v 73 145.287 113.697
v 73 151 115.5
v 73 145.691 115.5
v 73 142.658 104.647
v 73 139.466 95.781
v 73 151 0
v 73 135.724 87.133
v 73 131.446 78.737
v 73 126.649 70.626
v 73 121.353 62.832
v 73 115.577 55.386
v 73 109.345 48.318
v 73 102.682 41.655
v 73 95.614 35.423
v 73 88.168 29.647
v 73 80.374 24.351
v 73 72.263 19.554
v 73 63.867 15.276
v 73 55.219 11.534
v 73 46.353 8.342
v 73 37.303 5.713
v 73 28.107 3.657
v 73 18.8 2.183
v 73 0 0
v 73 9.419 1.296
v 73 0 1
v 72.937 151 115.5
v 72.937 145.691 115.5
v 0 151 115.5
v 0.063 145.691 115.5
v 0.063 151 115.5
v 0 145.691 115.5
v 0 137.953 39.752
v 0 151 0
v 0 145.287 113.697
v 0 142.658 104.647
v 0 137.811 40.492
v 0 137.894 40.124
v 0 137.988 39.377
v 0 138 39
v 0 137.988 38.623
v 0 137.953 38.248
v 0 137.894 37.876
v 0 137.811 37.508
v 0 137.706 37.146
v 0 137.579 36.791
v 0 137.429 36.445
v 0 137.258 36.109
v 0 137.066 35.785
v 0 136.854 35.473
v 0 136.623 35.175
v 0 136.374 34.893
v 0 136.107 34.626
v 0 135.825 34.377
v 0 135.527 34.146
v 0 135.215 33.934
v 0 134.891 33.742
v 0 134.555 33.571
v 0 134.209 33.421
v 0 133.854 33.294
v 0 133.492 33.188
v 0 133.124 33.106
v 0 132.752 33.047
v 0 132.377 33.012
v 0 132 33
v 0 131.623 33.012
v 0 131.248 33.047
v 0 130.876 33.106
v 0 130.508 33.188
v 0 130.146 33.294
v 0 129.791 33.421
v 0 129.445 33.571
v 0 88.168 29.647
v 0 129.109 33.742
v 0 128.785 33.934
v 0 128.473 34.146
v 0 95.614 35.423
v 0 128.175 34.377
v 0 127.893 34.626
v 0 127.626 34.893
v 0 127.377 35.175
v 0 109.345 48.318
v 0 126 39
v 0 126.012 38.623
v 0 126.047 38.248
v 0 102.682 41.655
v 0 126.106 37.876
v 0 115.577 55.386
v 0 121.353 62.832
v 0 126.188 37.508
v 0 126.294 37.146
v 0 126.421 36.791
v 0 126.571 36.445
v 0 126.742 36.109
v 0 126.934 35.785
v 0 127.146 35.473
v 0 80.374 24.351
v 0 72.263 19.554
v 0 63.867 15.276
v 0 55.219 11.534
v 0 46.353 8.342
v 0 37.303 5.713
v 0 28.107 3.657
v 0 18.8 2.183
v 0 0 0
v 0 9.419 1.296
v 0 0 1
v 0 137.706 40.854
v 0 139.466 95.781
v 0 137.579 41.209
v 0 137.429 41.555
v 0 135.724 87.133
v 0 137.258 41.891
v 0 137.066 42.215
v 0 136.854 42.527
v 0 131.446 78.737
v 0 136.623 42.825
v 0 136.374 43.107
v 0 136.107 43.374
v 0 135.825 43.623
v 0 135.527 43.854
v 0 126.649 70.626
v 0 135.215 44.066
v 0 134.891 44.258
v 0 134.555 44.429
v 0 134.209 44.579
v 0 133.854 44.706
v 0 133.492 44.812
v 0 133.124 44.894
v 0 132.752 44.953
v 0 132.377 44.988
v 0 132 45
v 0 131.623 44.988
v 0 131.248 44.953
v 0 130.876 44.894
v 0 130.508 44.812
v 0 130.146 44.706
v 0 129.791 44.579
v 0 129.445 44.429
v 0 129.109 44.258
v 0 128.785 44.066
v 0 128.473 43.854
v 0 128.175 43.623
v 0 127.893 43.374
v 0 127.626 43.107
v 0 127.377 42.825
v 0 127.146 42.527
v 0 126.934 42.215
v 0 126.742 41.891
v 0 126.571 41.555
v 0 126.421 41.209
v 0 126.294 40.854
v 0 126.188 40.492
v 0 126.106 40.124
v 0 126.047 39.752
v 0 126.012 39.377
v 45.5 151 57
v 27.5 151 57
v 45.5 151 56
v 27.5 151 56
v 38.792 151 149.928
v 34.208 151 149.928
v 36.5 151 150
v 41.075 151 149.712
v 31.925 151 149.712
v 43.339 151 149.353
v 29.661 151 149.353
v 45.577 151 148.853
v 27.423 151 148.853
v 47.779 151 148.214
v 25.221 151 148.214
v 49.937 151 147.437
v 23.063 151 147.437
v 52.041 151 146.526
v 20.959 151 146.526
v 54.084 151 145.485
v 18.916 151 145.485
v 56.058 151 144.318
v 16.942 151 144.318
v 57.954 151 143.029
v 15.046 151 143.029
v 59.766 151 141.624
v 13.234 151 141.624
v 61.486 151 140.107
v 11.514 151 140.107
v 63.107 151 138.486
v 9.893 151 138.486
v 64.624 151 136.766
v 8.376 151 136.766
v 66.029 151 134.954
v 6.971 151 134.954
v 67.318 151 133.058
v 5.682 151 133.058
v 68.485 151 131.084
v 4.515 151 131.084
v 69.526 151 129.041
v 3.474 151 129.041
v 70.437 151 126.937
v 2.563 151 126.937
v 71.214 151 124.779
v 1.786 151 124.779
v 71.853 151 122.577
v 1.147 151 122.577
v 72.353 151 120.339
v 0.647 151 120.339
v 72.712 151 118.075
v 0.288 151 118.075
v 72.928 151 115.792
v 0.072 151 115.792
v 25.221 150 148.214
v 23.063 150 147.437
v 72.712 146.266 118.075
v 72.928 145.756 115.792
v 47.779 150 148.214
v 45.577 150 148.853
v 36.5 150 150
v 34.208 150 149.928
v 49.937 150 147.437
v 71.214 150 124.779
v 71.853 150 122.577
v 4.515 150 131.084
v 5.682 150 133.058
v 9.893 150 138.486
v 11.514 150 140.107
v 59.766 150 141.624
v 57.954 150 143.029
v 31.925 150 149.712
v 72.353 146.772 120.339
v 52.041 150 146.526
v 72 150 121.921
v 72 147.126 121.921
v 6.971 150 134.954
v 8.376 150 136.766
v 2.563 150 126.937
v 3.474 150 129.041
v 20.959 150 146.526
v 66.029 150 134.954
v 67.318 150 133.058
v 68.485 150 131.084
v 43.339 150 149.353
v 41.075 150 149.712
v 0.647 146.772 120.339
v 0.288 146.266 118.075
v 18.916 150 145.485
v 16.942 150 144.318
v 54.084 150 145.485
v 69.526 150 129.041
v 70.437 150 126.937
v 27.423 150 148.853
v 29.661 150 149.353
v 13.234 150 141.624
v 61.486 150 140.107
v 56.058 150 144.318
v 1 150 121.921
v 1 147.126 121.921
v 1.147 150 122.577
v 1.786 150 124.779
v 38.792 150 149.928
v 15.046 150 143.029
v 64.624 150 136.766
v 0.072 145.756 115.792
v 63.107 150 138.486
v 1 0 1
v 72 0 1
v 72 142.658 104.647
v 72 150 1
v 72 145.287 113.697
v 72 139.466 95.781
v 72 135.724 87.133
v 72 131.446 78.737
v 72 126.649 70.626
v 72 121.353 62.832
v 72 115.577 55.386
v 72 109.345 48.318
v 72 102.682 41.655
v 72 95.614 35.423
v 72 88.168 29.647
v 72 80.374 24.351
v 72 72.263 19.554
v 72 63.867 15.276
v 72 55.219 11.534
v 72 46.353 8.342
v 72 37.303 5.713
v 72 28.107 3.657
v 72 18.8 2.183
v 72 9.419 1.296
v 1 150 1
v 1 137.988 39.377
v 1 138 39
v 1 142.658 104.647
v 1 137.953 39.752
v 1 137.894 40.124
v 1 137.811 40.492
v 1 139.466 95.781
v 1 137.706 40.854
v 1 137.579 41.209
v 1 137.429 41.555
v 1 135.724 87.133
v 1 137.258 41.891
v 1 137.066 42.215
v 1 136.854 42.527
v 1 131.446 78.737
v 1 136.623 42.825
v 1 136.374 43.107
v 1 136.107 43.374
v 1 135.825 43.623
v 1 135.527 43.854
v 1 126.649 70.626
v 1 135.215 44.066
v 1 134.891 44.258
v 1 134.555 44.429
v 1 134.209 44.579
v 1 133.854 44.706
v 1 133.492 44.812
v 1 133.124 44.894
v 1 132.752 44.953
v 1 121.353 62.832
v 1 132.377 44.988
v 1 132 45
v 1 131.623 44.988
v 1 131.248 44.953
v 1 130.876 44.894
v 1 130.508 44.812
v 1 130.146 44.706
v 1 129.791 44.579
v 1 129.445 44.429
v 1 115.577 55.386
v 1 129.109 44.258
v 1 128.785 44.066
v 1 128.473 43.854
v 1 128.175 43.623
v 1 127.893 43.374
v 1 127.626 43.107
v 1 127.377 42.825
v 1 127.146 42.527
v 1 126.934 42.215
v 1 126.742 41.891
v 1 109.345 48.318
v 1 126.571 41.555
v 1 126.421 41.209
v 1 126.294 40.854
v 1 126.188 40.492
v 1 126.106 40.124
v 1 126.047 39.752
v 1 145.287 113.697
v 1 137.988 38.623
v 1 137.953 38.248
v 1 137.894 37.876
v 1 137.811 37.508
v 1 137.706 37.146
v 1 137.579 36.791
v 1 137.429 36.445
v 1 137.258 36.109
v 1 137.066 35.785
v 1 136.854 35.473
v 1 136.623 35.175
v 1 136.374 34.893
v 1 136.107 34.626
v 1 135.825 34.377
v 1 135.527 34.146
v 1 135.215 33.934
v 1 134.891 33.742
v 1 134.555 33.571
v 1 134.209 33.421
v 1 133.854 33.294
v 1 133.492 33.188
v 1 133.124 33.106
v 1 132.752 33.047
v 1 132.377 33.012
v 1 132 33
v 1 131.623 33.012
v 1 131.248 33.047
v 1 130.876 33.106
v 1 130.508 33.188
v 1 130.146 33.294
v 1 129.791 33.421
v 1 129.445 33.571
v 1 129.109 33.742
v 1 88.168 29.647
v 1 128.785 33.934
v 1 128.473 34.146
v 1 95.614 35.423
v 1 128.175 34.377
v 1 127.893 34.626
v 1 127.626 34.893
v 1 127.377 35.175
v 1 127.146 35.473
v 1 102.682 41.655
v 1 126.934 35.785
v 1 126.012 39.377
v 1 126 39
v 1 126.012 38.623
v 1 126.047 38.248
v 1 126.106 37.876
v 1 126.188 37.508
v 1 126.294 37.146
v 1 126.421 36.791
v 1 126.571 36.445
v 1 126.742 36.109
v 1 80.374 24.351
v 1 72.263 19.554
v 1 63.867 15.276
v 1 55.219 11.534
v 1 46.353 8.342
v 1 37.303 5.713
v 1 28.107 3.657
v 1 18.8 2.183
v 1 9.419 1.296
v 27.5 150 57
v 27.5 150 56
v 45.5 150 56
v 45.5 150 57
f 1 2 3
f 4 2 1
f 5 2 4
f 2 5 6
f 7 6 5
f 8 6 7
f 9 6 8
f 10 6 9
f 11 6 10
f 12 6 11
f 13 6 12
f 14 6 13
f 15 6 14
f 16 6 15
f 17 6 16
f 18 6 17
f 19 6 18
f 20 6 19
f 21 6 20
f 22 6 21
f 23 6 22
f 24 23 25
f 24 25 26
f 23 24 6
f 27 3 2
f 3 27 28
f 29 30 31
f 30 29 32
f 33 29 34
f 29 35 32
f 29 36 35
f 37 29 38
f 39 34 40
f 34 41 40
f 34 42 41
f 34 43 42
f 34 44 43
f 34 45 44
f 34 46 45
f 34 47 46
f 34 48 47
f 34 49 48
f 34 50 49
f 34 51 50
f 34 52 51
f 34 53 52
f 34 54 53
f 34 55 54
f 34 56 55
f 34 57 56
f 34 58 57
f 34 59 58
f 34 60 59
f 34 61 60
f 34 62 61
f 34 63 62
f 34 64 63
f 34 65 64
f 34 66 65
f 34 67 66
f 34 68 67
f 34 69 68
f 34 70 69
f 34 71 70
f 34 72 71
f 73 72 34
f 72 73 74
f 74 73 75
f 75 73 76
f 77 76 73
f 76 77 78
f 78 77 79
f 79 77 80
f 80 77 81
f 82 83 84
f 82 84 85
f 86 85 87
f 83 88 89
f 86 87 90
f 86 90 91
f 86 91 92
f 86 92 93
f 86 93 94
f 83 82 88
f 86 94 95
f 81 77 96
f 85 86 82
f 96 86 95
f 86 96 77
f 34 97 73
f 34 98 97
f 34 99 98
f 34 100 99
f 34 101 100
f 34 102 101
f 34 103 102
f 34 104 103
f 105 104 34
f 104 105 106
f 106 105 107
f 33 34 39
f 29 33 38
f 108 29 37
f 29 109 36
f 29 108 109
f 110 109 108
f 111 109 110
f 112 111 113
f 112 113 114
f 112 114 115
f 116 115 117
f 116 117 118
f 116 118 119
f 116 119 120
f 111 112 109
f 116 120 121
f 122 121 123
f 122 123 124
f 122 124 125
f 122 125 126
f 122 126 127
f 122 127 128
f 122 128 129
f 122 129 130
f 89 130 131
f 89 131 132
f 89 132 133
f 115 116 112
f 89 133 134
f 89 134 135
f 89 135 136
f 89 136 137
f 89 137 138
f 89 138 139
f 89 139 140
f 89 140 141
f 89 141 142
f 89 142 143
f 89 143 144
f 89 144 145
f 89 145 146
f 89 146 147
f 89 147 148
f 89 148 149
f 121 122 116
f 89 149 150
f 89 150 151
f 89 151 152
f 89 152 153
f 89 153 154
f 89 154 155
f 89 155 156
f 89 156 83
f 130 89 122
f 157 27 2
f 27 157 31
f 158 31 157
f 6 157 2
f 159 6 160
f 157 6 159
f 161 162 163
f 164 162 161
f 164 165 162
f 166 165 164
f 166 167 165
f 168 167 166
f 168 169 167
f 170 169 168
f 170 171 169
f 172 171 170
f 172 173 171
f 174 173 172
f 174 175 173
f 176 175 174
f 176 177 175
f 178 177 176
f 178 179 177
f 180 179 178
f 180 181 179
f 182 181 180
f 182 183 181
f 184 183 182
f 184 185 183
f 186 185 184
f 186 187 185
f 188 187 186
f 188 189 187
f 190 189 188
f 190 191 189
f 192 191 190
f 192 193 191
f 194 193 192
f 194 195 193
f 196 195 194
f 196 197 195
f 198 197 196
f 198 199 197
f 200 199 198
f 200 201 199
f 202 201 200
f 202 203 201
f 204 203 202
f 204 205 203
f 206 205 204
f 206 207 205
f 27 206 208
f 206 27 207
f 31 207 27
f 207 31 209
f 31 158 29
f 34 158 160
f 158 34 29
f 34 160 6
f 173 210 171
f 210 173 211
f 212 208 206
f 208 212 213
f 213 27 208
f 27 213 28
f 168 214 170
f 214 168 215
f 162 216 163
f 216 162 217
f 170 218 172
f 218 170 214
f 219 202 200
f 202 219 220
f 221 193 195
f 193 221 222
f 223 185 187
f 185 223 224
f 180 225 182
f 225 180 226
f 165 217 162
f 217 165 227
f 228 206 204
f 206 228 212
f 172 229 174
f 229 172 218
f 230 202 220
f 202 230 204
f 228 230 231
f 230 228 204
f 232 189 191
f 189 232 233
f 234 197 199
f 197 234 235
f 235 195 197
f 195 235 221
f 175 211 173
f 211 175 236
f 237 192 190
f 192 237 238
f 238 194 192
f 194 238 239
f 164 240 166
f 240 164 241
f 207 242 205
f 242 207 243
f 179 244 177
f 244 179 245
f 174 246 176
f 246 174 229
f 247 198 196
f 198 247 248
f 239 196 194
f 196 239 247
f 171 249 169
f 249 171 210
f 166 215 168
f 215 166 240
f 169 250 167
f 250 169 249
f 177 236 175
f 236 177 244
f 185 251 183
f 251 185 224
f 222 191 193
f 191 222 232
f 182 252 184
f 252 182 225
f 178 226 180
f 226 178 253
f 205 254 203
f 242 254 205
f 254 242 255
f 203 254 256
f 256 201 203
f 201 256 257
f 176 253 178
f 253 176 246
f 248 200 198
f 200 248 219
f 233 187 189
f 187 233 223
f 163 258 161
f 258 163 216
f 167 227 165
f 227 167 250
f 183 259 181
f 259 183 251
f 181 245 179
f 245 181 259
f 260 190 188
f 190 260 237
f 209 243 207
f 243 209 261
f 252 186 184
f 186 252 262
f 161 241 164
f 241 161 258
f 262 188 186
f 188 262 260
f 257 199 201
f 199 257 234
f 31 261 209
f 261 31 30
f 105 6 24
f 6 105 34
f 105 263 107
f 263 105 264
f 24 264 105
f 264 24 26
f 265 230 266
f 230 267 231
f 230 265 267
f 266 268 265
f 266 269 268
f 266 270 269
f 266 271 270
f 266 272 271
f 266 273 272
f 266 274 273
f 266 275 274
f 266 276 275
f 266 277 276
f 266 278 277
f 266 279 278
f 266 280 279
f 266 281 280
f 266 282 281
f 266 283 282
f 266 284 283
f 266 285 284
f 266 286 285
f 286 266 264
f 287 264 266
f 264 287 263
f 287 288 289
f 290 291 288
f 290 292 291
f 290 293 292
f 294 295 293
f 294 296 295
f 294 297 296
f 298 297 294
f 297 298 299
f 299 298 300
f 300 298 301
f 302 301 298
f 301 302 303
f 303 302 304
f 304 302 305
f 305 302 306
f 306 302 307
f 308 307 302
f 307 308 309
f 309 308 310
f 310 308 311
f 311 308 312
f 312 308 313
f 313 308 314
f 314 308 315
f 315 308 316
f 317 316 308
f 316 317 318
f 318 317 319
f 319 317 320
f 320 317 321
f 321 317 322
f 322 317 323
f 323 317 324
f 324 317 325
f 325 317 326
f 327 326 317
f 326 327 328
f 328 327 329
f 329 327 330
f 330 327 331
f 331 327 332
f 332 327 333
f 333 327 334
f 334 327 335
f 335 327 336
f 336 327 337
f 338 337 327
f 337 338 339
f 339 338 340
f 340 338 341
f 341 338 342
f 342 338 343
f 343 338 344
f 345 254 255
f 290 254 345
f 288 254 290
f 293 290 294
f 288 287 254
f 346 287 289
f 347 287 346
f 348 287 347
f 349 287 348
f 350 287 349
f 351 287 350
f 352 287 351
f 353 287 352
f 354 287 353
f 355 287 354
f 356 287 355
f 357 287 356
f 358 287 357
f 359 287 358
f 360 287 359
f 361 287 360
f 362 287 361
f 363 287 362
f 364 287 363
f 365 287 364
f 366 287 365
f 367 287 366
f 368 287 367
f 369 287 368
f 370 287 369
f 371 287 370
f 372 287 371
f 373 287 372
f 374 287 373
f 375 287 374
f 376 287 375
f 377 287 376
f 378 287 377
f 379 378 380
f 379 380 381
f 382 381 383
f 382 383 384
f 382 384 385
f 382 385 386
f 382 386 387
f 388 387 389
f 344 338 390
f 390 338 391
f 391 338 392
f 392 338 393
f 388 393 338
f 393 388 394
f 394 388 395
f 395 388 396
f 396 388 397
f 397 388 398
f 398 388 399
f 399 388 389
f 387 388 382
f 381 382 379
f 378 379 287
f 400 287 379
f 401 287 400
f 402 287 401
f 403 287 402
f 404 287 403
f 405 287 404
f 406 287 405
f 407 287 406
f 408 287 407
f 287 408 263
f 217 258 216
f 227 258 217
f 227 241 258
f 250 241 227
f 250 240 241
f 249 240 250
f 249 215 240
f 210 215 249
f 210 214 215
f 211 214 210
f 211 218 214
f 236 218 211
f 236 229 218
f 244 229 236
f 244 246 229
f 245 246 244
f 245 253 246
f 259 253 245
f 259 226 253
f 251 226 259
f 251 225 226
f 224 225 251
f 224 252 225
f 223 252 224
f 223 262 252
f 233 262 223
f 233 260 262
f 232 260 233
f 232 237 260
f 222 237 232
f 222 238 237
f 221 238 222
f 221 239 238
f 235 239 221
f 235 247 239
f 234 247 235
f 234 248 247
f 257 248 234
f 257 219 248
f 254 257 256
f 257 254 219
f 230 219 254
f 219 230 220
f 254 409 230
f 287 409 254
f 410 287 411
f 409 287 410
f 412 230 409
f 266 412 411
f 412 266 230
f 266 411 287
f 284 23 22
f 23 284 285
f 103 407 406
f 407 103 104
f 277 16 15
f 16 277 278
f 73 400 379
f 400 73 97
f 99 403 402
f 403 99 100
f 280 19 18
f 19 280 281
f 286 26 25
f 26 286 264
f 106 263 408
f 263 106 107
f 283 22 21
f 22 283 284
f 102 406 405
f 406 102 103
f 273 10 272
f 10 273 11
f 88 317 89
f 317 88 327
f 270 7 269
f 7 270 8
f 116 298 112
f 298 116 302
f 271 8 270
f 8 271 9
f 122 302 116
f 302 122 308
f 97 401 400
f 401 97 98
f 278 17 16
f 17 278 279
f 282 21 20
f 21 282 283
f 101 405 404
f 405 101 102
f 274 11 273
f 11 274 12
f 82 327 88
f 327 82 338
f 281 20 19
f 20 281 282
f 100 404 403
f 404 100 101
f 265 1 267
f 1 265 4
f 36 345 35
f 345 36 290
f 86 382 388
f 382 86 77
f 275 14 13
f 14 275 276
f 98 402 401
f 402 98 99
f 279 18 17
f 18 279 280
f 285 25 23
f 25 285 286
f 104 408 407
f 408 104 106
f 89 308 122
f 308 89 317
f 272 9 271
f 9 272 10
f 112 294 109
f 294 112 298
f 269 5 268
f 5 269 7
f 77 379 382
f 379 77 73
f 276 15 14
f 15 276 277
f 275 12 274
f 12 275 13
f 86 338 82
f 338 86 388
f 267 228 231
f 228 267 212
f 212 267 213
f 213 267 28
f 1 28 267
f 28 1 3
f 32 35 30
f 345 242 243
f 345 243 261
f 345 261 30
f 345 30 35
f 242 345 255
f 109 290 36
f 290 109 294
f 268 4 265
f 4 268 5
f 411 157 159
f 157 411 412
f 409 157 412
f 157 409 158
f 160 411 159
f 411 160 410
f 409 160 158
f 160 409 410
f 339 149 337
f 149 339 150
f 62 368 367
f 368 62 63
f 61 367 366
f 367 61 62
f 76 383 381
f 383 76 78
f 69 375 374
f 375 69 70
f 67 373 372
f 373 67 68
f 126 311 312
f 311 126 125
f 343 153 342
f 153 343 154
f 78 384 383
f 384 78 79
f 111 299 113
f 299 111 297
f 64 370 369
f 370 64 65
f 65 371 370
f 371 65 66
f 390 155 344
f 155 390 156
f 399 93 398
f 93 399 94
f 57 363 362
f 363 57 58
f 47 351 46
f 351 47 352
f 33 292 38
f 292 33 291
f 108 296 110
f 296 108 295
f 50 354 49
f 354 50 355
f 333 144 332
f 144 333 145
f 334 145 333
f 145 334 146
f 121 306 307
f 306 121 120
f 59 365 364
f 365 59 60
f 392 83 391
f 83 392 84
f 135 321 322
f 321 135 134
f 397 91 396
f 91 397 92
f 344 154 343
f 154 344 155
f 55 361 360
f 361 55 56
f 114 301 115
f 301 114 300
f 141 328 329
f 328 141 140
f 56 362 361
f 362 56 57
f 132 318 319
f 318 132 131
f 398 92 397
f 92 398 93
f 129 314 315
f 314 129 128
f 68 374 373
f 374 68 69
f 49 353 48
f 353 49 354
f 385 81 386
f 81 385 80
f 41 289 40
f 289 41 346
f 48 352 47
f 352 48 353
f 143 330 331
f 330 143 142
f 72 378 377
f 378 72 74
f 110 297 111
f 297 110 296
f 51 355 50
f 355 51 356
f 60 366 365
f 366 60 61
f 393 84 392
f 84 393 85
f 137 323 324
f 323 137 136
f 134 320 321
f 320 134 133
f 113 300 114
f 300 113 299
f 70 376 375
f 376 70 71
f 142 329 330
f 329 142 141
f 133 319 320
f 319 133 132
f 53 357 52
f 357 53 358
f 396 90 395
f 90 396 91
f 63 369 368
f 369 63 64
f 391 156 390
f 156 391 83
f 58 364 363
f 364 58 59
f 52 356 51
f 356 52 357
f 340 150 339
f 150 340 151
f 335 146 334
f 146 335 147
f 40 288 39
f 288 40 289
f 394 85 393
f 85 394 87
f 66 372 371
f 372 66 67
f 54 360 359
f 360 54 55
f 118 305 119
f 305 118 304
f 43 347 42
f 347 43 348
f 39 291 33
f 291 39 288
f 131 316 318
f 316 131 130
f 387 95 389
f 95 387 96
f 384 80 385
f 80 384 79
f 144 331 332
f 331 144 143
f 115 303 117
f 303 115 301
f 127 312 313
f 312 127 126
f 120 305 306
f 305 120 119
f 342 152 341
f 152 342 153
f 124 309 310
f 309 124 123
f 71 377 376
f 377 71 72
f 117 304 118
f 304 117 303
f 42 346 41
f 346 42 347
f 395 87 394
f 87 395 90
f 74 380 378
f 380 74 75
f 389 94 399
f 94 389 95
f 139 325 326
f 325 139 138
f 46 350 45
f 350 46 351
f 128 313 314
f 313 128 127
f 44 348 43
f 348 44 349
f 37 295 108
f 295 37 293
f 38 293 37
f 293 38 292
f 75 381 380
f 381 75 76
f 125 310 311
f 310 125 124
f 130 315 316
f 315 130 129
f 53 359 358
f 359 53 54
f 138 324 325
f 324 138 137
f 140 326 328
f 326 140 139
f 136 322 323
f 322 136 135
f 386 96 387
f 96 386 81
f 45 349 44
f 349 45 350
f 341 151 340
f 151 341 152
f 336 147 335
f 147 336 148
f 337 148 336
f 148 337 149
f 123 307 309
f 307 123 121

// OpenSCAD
width=71;
length=150;
main_height=20;
front_height=150;
wall=1;

camera_cable_hole_width=18;
camera_cable_hole_height=1;
camera_cable_hole_z=56;

power_hole_z = 38;
power_hole_y=length-18;
power_hole_r=6;

$fn=100;

difference() {
    cube([width+wall*2,length+wall,front_height+wall]);
    
    // inside
    translate([wall,0,wall])
    cube([width,length,front_height]);
    
    // curve
    translate([0,length-front_height,front_height+wall])
    rotate([0,90,0])
    cylinder(width+wall*2,r=front_height);
    
    // camera cable hole
    #translate([
        (width-camera_cable_hole_width)/2+wall,
        length,
        camera_cable_hole_z
    ])
    cube([camera_cable_hole_width,wall,camera_cable_hole_height]);
    
    //power hole
    #
    translate([0,power_hole_y,power_hole_z+wall])
    rotate([0,90,0])
    cylinder(h=wall,r=power_hole_r);
    
    // top cut
    #difference() {
        translate([0,0,front_height-width/2+wall])
        cube([width+wall*2,length+wall,width/2]);

        translate([width/2+wall,length+wall,front_height-(width/2+wall)])
        rotate([90,0,0])
        cylinder(h=length+wall,r=width/2+wall);
    }
}
